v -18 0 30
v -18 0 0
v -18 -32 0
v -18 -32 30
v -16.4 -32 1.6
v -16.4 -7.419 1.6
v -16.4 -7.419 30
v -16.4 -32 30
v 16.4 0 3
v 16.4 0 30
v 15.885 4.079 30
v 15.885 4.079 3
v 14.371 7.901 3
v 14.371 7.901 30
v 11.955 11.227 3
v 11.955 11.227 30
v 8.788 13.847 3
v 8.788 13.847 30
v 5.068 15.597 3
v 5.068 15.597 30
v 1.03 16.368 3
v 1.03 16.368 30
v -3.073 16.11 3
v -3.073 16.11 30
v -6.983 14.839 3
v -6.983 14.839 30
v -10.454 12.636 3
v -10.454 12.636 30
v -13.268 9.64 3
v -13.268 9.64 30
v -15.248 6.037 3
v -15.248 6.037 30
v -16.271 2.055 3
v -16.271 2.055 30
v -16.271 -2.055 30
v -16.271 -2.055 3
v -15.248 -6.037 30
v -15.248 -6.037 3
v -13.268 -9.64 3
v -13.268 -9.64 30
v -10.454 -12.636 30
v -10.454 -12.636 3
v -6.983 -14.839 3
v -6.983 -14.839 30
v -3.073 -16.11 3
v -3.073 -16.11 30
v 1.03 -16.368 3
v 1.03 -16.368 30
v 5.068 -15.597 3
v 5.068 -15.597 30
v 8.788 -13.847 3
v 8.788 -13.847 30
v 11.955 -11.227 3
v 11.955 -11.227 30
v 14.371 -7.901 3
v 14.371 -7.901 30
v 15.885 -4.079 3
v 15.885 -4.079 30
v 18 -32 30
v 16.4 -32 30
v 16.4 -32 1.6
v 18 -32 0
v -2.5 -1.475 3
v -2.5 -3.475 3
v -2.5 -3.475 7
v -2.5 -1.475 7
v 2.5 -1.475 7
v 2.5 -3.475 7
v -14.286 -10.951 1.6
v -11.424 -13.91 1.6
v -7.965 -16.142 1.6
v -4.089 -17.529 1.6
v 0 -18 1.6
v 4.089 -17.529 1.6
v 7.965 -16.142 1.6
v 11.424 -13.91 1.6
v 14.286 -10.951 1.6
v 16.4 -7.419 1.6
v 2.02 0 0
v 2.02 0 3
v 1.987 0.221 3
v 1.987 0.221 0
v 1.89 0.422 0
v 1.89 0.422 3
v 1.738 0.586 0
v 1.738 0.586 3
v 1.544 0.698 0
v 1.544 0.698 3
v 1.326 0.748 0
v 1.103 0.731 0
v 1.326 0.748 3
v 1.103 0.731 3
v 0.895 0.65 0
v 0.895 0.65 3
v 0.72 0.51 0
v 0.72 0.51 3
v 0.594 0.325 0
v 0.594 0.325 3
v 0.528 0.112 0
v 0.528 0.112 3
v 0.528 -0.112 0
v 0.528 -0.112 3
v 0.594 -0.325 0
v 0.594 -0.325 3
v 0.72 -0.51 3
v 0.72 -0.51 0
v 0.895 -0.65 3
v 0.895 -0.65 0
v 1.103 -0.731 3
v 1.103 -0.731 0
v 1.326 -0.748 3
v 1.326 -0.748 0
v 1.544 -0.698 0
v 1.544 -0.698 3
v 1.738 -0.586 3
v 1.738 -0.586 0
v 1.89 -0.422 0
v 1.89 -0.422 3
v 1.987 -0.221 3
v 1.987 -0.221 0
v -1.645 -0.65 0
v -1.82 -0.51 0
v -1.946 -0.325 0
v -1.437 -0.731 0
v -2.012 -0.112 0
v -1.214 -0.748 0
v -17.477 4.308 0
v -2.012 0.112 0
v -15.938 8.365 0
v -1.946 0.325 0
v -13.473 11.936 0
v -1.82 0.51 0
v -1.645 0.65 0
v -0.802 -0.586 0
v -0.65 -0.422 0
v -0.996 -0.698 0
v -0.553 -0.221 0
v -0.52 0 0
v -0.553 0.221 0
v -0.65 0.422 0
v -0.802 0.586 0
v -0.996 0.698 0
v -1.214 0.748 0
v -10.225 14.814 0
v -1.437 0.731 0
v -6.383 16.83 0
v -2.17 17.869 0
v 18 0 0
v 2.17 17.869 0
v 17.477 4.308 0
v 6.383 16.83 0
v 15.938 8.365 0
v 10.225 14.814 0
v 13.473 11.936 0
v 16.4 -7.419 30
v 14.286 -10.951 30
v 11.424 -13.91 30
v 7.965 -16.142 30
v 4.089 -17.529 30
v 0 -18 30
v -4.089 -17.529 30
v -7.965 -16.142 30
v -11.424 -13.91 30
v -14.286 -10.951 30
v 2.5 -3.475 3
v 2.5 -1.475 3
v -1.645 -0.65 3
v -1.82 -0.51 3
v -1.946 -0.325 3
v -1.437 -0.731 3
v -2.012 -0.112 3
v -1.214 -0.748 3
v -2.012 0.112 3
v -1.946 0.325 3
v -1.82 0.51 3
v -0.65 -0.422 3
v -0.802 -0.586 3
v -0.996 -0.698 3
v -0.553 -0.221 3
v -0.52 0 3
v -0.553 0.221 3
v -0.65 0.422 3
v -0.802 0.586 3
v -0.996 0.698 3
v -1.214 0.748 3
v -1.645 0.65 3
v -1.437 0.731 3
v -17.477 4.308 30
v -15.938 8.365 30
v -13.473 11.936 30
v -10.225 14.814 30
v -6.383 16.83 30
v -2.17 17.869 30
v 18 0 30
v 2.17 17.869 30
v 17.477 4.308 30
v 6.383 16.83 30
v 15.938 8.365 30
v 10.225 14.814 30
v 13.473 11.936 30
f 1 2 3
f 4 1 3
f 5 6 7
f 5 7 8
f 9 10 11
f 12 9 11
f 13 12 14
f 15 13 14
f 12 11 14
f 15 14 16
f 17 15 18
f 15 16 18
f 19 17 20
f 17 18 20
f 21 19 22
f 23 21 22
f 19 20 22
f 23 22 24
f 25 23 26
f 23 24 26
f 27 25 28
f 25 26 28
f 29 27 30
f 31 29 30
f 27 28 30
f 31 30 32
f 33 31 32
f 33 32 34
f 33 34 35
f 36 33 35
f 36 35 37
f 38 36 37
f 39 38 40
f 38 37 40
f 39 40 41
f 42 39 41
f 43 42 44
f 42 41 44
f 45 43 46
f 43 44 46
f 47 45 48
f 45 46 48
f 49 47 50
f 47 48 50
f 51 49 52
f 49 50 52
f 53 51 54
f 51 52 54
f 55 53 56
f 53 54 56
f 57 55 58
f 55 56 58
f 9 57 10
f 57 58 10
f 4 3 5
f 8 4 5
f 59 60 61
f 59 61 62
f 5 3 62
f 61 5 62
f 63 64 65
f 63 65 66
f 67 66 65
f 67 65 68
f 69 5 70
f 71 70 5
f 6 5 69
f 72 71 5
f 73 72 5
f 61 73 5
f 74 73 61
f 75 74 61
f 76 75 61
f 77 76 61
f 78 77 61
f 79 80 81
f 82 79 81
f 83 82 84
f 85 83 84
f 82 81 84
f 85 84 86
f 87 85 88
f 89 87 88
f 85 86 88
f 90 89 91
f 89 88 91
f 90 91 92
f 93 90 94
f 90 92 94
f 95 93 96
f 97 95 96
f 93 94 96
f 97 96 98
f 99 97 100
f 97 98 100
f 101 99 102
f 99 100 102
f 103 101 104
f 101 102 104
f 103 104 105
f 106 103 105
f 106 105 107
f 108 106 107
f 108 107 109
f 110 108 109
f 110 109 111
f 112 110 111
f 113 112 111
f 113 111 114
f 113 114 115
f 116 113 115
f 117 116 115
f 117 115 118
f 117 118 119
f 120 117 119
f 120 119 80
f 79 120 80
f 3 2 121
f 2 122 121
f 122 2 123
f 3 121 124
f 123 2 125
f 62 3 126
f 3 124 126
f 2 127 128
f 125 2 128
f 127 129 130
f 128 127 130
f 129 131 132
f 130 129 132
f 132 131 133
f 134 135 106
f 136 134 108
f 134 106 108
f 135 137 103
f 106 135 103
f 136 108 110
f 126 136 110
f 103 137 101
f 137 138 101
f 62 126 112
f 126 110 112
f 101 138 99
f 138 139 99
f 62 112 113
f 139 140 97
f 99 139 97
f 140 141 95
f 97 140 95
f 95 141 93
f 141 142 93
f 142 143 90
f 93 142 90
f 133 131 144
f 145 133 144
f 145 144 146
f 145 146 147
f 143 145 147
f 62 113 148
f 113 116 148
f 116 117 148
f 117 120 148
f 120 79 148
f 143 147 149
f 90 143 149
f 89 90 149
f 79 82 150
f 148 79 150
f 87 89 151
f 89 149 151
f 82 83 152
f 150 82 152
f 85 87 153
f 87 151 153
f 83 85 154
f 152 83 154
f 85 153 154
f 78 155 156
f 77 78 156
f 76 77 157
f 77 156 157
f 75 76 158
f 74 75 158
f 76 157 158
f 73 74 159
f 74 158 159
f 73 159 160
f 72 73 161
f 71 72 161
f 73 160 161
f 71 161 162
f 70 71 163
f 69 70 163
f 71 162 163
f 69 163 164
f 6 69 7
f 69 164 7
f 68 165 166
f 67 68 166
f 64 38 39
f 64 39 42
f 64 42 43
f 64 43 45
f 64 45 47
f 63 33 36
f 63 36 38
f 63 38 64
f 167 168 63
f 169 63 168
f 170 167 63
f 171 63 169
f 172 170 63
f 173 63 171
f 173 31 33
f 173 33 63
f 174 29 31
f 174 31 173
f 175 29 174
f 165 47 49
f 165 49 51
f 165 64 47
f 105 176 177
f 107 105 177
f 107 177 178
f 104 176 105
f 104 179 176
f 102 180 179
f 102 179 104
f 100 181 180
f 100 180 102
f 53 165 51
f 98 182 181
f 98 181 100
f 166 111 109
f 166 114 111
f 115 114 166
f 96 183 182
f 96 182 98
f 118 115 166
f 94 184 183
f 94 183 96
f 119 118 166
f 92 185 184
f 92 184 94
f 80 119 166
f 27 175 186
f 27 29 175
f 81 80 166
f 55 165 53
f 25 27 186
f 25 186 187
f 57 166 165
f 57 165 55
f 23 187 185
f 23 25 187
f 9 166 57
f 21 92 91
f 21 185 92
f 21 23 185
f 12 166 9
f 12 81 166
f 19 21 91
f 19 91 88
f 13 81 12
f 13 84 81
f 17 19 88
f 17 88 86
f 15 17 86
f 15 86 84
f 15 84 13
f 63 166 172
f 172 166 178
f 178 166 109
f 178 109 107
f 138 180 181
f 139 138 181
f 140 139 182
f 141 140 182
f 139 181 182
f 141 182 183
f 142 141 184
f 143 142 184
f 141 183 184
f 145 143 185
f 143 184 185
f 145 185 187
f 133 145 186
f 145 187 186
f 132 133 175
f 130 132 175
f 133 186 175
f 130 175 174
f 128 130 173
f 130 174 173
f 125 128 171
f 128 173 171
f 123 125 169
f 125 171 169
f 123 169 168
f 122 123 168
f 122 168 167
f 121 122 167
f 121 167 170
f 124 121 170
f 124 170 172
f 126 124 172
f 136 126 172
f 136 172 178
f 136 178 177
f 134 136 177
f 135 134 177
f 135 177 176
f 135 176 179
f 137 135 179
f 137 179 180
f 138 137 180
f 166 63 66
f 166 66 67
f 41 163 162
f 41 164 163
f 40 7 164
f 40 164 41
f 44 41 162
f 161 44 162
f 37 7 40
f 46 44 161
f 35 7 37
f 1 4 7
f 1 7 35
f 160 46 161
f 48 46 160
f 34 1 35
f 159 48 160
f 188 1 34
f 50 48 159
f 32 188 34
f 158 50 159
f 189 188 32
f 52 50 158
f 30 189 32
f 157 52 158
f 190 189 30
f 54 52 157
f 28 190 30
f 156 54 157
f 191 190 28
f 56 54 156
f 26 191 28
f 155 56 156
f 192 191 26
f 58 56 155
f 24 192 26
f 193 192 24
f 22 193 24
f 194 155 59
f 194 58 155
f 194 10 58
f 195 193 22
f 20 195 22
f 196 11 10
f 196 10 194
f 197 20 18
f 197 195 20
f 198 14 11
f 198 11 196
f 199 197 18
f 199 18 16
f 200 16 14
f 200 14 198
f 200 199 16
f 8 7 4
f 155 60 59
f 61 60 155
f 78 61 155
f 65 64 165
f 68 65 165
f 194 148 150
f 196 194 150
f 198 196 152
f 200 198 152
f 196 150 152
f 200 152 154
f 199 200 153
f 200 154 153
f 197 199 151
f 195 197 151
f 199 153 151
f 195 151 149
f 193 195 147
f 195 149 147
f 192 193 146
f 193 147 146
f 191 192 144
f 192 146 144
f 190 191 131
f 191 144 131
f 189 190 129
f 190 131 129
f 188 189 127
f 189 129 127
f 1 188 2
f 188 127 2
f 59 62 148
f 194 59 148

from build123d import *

# Parameters (mm, degrees)
BOSS_EXTRUDE1_DEPTH            = 30
CUT_EXTRUDE1_DEPTH             = 27
SKETCH4_R                      = 0.75
CUT_EXTRUDE2_DEPTH             = 46.57411546
SKETCH5_W                      = 5
SKETCH5_H                      = 2
BOSS_EXTRUDE2_DEPTH            = 4
SHELL1_START                   = 1.6
SHELL1_DEPTH                   = 26.8
CUT_EXTRUDE3_REACH             = 49.413
CUT_EXTRUDE3_DIRECTION_2_DEPTH = 48.413078365


# Read off the part's stored shape, not the designer's step: Shell1
with BuildPart() as part:
    # Sketch2 → Boss-Extrude1 (new body)
    with BuildSketch(Plane.XY):
        with BuildLine():
            Line((-18, 0), (-18, -32))
            Line((-18, -32), (18, -32))
            Line((18, -32), (18, 0))
            ThreePointArc((18, 0), (0, 18), (-18, 0))
        make_face()
    extrude(amount=BOSS_EXTRUDE1_DEPTH)

    # Sketch3 → Cut-Extrude1 (cut)
    with BuildSketch(Plane.XY.offset(30)):
        with BuildLine():
            ThreePointArc((-16.4, 0), (0, -16.4), (16.4, 0))
            ThreePointArc((16.4, 0), (0, 16.4), (-16.4, 0))
        make_face()
    extrude(amount=-CUT_EXTRUDE1_DEPTH, mode=Mode.SUBTRACT)

    # Sketch4 → Cut-Extrude2 (cut, through all)
    with BuildSketch(Plane.XY.offset(3)):
        with Locations((-1.27, 0)):
            Circle(SKETCH4_R)
        with Locations((1.27, 0)):
            Circle(SKETCH4_R)
    extrude(amount=-CUT_EXTRUDE2_DEPTH, mode=Mode.SUBTRACT)

    # Sketch5 → Boss-Extrude2 (add)
    with BuildSketch(Plane.XY.offset(3)):
        with Locations((0, -2.475)):
            Rectangle(SKETCH5_W, SKETCH5_H)
    extrude(amount=BOSS_EXTRUDE2_DEPTH)

    # Shell1 outline → Shell1 (cut)
    with BuildSketch(Plane.XY.offset(SHELL1_START)):
        with BuildLine():
            ThreePointArc((16.4, -7.418894796), (0, -18), (-16.4, -7.418894796))
            Line((-16.4, -7.418894796), (-16.4, -32))
            Line((-16.4, -32), (16.4, -32))
            Line((16.4, -32), (16.4, -7.418894796))
        make_face()
    extrude(amount=SHELL1_DEPTH, mode=Mode.SUBTRACT)

    # Sketch6 → Cut-Extrude3 (cut, up to next)
    with BuildSketch(Plane.XY.offset(30), mode=Mode.PRIVATE) as cut_extrude3_sk1:
        with BuildLine():
            Line((-16.4, -32), (16.4, -32))
            Line((16.4, -32), (16.4, -7.418894796))
            ThreePointArc((16.4, -7.418894796), (0, -18), (-16.4, -7.418894796))
            Line((-16.4, -7.418894796), (-16.4, -32))
        make_face()
    cut_extrude3_tool1 = extrude(cut_extrude3_sk1.sketch, amount=-CUT_EXTRUDE3_REACH, mode=Mode.PRIVATE) & part.part
    add(cut_extrude3_tool1.solids().sort_by_distance((0, -23.265352, 30))[0], mode=Mode.SUBTRACT)

    # Sketch6 → Cut-Extrude3 direction 2 (cut)
    with BuildSketch(Plane.XY.offset(30)):
        with BuildLine():
            Line((-16.4, -32), (16.4, -32))
            Line((16.4, -32), (16.4, -7.418894796))
            ThreePointArc((16.4, -7.418894796), (0, -18), (-16.4, -7.418894796))
            Line((-16.4, -7.418894796), (-16.4, -32))
        make_face()
    extrude(amount=CUT_EXTRUDE3_DIRECTION_2_DEPTH, mode=Mode.SUBTRACT)


solid = part.part
